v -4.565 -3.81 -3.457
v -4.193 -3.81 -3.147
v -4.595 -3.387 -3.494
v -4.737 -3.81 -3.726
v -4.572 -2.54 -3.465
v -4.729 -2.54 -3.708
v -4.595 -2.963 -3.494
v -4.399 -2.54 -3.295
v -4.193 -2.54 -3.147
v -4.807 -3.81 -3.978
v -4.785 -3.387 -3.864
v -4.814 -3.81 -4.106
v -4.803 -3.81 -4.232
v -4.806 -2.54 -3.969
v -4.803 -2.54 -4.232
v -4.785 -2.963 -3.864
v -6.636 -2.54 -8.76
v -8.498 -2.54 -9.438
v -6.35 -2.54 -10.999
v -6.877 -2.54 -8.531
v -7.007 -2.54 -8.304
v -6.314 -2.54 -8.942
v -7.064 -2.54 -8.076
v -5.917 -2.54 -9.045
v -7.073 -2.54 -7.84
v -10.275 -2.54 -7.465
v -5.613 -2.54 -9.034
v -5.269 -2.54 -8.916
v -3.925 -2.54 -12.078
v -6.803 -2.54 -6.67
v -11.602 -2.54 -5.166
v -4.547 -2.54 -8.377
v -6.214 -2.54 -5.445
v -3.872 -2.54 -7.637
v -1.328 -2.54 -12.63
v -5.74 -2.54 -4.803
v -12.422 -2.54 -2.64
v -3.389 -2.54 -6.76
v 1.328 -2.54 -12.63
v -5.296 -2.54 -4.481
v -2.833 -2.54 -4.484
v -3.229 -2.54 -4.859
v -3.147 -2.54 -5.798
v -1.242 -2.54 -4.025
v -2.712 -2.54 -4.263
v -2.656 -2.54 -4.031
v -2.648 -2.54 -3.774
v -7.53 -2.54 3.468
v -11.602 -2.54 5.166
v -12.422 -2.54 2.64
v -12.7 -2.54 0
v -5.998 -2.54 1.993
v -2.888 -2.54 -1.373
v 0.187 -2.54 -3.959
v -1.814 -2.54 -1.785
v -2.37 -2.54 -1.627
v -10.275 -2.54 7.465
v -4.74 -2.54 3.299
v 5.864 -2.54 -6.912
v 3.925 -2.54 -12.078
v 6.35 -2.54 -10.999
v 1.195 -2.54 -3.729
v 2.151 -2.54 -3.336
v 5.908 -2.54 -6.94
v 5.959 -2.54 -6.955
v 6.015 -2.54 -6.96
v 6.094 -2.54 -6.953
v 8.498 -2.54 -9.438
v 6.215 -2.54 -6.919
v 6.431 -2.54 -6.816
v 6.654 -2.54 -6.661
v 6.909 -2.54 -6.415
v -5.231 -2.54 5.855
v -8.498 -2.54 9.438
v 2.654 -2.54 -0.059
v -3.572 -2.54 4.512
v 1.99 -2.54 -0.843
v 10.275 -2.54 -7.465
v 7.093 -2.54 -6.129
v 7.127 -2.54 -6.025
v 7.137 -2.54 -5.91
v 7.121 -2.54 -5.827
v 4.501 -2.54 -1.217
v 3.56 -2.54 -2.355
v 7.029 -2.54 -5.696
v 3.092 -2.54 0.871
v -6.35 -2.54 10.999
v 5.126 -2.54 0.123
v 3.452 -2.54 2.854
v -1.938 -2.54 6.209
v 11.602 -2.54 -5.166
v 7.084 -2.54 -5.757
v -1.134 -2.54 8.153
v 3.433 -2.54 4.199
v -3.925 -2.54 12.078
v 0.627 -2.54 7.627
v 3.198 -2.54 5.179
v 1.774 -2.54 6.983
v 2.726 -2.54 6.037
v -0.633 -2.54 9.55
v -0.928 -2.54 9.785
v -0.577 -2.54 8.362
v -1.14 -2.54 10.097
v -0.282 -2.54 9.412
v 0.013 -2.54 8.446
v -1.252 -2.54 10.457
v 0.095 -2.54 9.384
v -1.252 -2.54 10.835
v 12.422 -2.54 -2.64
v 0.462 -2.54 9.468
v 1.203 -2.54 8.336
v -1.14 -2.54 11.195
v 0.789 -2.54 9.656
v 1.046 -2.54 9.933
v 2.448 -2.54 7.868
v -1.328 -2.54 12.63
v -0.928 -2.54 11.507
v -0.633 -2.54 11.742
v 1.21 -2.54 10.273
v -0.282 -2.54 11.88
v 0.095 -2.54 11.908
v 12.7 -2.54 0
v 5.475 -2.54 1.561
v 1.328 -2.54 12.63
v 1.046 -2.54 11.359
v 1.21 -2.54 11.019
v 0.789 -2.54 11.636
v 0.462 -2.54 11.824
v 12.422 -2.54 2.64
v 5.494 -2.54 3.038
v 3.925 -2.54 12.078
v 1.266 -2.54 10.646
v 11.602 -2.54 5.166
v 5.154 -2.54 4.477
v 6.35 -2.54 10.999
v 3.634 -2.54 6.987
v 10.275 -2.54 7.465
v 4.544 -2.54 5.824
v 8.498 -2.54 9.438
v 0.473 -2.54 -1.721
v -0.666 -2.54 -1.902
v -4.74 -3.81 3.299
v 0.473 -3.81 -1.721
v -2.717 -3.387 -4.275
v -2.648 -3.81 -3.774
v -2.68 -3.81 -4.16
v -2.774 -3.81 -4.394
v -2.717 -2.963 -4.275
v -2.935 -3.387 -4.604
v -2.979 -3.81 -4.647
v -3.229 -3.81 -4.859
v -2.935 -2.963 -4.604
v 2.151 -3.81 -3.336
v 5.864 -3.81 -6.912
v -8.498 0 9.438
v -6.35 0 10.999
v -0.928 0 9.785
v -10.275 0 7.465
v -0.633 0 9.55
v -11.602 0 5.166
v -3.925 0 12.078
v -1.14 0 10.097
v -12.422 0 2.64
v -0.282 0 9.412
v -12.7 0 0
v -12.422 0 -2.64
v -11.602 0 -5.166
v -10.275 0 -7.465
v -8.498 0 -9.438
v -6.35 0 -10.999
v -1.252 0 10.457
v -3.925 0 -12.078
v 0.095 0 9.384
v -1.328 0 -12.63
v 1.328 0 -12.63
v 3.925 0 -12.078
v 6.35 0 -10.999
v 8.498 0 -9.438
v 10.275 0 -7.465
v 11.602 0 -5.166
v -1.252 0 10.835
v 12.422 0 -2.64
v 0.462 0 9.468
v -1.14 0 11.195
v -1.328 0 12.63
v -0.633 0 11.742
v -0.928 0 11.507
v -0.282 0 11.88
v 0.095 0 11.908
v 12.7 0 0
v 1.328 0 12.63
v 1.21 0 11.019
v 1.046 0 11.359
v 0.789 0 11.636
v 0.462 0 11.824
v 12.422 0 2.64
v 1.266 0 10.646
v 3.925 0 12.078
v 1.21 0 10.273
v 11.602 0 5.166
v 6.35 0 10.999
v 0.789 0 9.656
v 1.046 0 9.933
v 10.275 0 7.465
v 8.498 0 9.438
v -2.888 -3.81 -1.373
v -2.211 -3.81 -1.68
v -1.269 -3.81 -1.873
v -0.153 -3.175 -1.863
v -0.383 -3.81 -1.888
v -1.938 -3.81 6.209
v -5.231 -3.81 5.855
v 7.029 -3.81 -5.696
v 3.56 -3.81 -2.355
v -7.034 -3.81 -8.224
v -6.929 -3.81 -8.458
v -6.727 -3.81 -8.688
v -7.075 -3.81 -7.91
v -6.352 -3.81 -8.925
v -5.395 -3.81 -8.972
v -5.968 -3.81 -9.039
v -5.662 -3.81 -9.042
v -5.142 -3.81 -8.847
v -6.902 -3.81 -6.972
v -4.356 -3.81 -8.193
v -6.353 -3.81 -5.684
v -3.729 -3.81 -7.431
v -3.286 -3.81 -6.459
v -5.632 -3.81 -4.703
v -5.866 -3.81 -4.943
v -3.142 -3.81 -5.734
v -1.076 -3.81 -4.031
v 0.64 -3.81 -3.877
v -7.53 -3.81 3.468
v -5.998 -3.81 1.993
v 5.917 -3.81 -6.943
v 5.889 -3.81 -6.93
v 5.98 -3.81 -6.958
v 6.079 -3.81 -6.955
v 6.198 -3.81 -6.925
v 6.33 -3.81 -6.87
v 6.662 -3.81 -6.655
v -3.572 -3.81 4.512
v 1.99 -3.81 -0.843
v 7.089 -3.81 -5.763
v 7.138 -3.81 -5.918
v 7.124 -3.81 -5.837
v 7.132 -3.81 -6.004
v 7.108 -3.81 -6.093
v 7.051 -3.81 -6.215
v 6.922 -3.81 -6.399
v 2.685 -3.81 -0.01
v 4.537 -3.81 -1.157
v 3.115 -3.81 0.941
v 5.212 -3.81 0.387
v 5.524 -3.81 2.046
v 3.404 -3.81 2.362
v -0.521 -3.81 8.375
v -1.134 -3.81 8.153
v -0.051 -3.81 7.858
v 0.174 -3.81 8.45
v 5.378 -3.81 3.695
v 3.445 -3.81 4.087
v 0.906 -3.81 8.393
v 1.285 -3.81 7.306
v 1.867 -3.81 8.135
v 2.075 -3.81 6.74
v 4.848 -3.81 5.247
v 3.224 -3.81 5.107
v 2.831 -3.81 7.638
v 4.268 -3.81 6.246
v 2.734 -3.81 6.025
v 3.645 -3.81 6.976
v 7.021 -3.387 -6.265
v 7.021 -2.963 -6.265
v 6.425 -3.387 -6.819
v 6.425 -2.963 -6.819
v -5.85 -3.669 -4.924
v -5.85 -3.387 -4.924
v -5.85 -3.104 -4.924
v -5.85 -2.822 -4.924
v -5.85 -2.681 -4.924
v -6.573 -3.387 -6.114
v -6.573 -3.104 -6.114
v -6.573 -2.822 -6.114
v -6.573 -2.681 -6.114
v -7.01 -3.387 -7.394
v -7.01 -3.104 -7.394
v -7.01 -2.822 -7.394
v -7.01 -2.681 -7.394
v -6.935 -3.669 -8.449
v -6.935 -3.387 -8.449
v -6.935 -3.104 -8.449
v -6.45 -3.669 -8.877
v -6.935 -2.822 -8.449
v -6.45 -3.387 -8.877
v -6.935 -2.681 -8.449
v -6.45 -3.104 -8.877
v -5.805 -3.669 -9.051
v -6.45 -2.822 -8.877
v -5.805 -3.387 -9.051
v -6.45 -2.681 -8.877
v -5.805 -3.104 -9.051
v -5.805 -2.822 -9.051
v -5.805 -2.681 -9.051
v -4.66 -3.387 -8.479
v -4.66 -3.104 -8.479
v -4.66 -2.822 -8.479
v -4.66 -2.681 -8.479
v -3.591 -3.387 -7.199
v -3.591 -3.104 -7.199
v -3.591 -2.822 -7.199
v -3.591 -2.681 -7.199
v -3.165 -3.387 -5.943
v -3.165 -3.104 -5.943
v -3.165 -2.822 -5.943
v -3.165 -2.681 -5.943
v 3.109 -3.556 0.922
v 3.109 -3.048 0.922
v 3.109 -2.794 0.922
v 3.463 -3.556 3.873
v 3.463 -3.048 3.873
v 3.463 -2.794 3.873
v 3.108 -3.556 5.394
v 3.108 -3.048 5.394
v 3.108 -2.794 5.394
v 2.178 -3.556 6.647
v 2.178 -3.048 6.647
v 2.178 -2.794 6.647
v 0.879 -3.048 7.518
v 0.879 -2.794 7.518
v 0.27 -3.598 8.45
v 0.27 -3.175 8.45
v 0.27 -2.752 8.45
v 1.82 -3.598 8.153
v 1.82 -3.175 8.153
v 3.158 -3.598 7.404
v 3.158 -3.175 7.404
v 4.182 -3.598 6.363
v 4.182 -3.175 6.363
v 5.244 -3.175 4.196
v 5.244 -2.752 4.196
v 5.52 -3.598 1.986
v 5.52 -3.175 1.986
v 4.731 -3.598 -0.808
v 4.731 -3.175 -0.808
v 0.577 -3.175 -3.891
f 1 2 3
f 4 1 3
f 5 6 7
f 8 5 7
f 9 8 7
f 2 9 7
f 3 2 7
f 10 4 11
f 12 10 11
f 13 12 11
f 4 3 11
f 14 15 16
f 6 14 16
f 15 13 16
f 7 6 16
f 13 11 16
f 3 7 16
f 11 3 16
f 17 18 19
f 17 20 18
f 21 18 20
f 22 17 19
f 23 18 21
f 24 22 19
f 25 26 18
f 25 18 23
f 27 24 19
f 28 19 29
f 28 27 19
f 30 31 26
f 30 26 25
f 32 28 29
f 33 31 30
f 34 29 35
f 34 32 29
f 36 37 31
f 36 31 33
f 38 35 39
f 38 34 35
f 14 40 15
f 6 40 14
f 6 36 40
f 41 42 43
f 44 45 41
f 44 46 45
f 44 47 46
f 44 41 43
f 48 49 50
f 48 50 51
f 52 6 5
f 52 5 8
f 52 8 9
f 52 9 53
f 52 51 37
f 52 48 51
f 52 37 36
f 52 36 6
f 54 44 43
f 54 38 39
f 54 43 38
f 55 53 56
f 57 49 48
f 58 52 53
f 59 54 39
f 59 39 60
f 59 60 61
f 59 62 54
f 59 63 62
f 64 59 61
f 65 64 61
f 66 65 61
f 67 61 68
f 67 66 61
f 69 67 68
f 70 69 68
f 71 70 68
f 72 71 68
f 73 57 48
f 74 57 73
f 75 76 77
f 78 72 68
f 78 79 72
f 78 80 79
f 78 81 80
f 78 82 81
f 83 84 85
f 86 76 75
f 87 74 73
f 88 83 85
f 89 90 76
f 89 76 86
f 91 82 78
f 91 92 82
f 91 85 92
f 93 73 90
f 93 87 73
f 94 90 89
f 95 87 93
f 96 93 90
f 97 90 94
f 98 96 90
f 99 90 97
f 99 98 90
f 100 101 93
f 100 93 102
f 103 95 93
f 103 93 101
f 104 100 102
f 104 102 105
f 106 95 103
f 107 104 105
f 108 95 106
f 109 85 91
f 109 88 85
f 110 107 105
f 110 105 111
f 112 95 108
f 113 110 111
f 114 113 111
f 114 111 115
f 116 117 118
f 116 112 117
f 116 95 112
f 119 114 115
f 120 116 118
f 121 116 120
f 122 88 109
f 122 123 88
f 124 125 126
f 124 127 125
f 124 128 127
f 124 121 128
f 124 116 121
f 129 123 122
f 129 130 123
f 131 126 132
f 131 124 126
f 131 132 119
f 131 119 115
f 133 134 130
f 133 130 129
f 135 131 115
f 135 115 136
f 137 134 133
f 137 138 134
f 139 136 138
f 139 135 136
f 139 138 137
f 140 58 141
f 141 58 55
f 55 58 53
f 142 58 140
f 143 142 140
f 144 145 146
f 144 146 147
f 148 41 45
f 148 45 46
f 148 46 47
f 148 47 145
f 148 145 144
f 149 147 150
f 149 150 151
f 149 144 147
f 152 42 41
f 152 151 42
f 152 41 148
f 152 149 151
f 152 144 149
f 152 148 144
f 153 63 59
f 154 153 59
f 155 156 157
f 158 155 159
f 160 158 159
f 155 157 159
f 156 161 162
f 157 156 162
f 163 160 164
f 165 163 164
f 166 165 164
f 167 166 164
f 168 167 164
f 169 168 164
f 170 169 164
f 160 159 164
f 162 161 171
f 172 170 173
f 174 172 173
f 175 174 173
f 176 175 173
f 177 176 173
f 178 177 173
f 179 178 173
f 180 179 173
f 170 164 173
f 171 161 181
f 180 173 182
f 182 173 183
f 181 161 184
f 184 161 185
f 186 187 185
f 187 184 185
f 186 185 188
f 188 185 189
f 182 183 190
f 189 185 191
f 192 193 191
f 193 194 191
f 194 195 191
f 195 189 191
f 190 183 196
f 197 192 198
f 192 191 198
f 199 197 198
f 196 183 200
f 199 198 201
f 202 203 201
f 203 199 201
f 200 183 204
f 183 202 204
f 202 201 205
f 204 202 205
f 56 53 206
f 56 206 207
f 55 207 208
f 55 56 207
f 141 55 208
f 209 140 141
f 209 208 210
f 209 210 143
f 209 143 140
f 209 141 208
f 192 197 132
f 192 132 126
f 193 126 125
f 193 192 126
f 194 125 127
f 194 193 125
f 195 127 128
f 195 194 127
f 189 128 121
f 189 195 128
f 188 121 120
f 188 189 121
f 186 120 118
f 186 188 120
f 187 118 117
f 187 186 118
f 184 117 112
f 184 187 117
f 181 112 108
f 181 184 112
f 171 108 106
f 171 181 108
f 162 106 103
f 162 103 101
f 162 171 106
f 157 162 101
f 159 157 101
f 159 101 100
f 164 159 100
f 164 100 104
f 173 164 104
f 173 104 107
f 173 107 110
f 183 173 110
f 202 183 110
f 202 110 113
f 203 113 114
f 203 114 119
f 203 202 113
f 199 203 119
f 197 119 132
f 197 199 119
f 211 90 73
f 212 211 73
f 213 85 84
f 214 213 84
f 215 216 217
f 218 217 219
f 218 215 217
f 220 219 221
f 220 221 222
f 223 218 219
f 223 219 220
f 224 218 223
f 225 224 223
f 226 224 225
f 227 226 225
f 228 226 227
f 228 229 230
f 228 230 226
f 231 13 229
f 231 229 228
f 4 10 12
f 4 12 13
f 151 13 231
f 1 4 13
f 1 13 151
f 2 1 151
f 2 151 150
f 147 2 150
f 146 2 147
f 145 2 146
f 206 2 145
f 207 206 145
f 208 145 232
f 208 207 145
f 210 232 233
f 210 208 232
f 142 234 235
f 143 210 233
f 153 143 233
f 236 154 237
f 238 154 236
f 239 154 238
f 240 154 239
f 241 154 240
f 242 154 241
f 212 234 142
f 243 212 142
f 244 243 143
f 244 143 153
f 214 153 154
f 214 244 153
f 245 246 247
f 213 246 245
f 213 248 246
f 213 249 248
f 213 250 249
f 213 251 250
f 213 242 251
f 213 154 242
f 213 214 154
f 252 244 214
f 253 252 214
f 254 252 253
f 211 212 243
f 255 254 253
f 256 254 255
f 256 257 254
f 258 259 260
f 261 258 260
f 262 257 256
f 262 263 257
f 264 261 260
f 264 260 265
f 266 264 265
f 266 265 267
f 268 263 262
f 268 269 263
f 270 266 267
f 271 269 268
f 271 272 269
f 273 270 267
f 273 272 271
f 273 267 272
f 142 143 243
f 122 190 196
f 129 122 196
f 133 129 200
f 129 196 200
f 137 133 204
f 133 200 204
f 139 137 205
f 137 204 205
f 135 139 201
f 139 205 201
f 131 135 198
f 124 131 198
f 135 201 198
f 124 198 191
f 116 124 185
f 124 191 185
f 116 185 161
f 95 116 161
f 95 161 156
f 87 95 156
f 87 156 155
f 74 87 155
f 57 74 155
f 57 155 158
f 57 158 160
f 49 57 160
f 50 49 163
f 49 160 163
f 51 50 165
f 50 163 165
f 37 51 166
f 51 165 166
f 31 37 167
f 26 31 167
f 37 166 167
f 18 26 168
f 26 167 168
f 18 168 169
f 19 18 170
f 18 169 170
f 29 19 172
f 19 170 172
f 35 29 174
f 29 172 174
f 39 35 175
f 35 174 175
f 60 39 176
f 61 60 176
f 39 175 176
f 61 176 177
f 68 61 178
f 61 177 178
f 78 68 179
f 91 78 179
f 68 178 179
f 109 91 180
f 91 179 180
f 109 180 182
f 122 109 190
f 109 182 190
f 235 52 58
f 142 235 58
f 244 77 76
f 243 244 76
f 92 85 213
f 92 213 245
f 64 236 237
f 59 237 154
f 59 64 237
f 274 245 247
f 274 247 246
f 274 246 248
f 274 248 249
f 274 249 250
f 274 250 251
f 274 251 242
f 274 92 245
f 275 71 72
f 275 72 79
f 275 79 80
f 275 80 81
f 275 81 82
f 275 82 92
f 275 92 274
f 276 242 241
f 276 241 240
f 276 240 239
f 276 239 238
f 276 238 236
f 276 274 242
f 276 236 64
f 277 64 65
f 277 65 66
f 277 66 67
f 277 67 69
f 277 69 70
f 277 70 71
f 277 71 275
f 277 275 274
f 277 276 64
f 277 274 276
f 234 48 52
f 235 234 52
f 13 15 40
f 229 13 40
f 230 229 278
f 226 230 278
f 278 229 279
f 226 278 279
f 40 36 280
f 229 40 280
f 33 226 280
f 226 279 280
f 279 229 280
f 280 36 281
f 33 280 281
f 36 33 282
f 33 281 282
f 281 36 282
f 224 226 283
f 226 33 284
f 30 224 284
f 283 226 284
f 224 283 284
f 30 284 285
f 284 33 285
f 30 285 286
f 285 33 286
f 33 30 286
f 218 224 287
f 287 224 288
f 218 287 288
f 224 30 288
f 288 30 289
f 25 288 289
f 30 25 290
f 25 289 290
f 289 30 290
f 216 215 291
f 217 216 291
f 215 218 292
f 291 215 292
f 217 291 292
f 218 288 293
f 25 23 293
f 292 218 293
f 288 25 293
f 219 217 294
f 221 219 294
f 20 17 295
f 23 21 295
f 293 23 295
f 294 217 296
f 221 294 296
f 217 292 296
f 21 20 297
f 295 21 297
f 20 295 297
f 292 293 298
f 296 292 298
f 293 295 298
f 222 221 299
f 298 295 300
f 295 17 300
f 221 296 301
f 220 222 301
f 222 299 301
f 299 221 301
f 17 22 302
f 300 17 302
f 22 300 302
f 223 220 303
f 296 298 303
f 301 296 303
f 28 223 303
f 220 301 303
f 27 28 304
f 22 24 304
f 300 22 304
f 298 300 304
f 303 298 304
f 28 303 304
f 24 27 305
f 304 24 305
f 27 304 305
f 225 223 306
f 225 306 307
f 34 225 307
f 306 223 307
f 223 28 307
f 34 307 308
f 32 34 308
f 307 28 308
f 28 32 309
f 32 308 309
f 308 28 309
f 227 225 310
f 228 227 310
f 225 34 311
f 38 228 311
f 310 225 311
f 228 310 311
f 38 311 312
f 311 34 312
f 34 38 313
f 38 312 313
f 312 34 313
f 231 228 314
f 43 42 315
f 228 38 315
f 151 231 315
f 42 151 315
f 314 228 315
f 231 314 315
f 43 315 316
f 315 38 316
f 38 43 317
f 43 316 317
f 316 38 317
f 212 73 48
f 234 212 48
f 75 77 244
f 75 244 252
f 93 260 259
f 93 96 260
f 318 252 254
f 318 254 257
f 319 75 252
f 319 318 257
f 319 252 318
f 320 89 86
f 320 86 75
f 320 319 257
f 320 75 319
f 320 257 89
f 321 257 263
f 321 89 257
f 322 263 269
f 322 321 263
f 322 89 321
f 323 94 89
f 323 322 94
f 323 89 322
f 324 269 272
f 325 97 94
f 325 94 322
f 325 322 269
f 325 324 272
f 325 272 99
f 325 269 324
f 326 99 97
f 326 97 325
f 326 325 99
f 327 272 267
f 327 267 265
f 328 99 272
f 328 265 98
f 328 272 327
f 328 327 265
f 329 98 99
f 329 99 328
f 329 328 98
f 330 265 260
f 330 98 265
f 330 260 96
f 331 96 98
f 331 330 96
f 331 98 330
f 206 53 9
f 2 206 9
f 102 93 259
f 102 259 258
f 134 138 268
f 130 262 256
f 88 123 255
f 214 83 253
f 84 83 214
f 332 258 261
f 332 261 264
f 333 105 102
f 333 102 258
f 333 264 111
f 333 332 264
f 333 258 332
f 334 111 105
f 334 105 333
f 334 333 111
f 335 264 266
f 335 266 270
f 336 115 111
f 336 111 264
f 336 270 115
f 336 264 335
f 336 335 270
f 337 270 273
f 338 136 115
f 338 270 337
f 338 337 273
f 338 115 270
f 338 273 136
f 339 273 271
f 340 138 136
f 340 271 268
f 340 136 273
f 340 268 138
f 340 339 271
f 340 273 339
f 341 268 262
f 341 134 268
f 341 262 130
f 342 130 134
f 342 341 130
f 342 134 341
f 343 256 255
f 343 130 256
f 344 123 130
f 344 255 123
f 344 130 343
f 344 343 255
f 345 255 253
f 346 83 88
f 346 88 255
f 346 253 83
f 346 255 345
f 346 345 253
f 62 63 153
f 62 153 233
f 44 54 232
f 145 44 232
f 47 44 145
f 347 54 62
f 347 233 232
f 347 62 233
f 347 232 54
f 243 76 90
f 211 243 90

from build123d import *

# Parameters (mm, degrees)
F0_R     = 12.7
F0_R_2   = 1.2657765137
F1_DEPTH = 2.54
F2_DEPTH = 3.81


with BuildPart() as f1:
    # F0 (on Front) → F1 (new body)
    with BuildSketch(Plane.XZ):
        Circle(F0_R)
        with BuildLine():
            Line((-5.9980981207, 1.9931174991), (-7.5295561864, 3.4678540847))
            Line((-7.5295561864, 3.4678540847), (-5.2310121246, 5.8548050001))
            Line((-5.2310121246, 5.8548050001), (-1.9379338482, 6.2094442546))
            Line((-1.9379338482, 6.2094442546), (-3.5720530129, 4.5124734196))
            Line((-3.5720530129, 4.5124734196), (1.9898101435, -0.8433918597))
            add(Edge.make_bspline(
                [(1.9898101435, -0.8433918597), (2.181839817, -0.6686980904), (2.9923268789, 0.2254004935), (3.5097247457, 2.2611806235), (3.5582576463, 5.5722342669), (1.0757347307, 7.7154267447), (-0.6801631143, 8.0019912543), (-1.1338472479, 8.1532060726)],
                knots=[0.2966989611, 0.2966989611, 0.2966989611, 0.2966989611, 0.3408733214, 0.5050447961, 0.6807588711, 0.8554095009, 1, 1, 1, 1], degree=3))
            add(Edge.make_bspline(
                [(-1.1338472479, 8.1532060726), (-0.3417312748, 8.5800115317), (2.0076237784, 8.4565524057), (4.3362523203, 6.5122135204), (5.3334470637, 4.2153426842), (5.7115580421, 1.9856279561), (4.9509483833, -0.7254500645), (4.0310276615, -1.9202184076), (3.5599331607, -2.3553613411)],
                knots=[0, 0, 0, 0, 0.1298019735, 0.2598346579, 0.3771771158, 0.4898846412, 0.6185830731, 0.71201256, 0.71201256, 0.71201256, 0.71201256], degree=3))
            Line((3.5599331607, -2.3553613411), (7.0293718017, -5.6963004173))
            add(Edge.make_bspline(
                [(7.0293718017, -5.6963004173), (7.5221849988, -6.1239386803), (6.1995871365, -7.1983786766), (5.8641284704, -6.9122067653)],
                knots=[0, 0, 0, 0, 1.6841081521, 1.6841081521, 1.6841081521, 1.6841081521], degree=3))
            Line((5.8641284704, -6.9122067653), (2.1508335508, -3.3364432536))
            add(Edge.make_bspline(
                [(2.1508335508, -3.3364432536), (1.6752853418, -3.5797182972), (0.1572248048, -4.1350575123), (-1.7609307542, -4.0777400136), (-2.6475286577, -3.7737630773)],
                knots=[0.7925286484, 0.7925286484, 0.7925286484, 0.7925286484, 0.8643366586, 1, 1, 1, 1], degree=3))
            add(Edge.make_bspline(
                [(-2.6475286577, -3.7737630773), (-2.6181081776, -4.3935817666), (-2.9226117767, -4.6085258946), (-3.22854775, -4.8588160425)],
                knots=[0, 0, 0, 0, 1.230822133, 1.230822133, 1.230822133, 1.230822133], degree=3))
            add(Edge.make_bspline(
                [(-4.8033702187, -4.2323740199), (-5.4212825728, -4.5293064688), (-5.8316147769, -4.7778373261), (-6.6343124935, -6.1229466147), (-7.0458907635, -7.3455408415), (-7.16887863, -8.5506128462), (-5.7407828877, -9.3119682828), (-4.6015383692, -8.4966283885), (-3.5049723158, -7.3084696393), (-3.0930861156, -5.8275163642), (-3.1405196662, -5.4844899198), (-3.22854775, -4.8588160425)],
                knots=[0, 0, 0, 0, 0.1093958452, 0.2246343447, 0.3382227988, 0.4386314231, 0.5491357113, 0.6596208576, 0.7857586816, 0.8981987194, 1, 1, 1, 1], degree=3))
            add(Edge.make_bspline(
                [(-4.1932296008, -3.1469750684), (-4.7146673314, -3.4729705658), (-4.8571061343, -3.8741342723), (-4.8033702187, -4.2323740199)],
                knots=[0, 0, 0, 0, 1.2451355178, 1.2451355178, 1.2451355178, 1.2451355178], degree=3))
            Line((-4.1932296008, -3.1469750684), (-2.8876534512, -1.373414264))
            add(Edge.make_bspline(
                [(-2.8876534512, -1.373414264), (-2.386986779, -1.7200056059), (-0.9613233884, -2.068928273), (0.2712498796, -1.7849151458), (0.4732034023, -1.7209484435)],
                knots=[0, 0, 0, 0, 0.1659033418, 0.1998088447, 0.1998088447, 0.1998088447, 0.1998088447], degree=3))
            Line((0.4732034023, -1.7209484435), (-4.740216914, 3.2993794706))
            Line((-4.740216914, 3.2993794706), (-5.9980981207, 1.9931174991))
        make_face(mode=Mode.SUBTRACT)
        with Locations((0, 10.6459101662)):
            Circle(F0_R_2, mode=Mode.SUBTRACT)
        with BuildLine():
            add(Edge.make_bspline(
                [(0.4732034023, -1.7209484435), (1.0503162203, -1.5381538908), (1.5686206286, -1.2265575579), (1.9898101435, -0.8433918597)],
                knots=[0.1998088447, 0.1998088447, 0.1998088447, 0.1998088447, 0.2966989611, 0.2966989611, 0.2966989611, 0.2966989611], degree=3))
            add(Edge.make_bspline(
                [(-2.8876534512, -1.373414264), (-2.386986779, -1.7200056059), (-0.9613233884, -2.068928273), (0.2712498796, -1.7849151458), (0.4732034023, -1.7209484435)],
                knots=[0, 0, 0, 0, 0.1659033418, 0.1998088447, 0.1998088447, 0.1998088447, 0.1998088447], degree=3))
            Line((-2.8876534512, -1.373414264), (-4.1932296008, -3.1469750684))
            add(Edge.make_bspline(
                [(-4.1932296008, -3.1469750684), (-4.7146673314, -3.4729705658), (-4.8571061343, -3.8741342723), (-4.8033702187, -4.2323740199)],
                knots=[0, 0, 0, 0, 1.2451355178, 1.2451355178, 1.2451355178, 1.2451355178], degree=3))
            add(Edge.make_bspline(
                [(-4.8033702187, -4.2323740199), (-5.4212825728, -4.5293064688), (-5.8316147769, -4.7778373261), (-6.6343124935, -6.1229466147), (-7.0458907635, -7.3455408415), (-7.16887863, -8.5506128462), (-5.7407828877, -9.3119682828), (-4.6015383692, -8.4966283885), (-3.5049723158, -7.3084696393), (-3.0930861156, -5.8275163642), (-3.1405196662, -5.4844899198), (-3.22854775, -4.8588160425)],
                knots=[0, 0, 0, 0, 0.1093958452, 0.2246343447, 0.3382227988, 0.4386314231, 0.5491357113, 0.6596208576, 0.7857586816, 0.8981987194, 1, 1, 1, 1], degree=3))
            add(Edge.make_bspline(
                [(-2.6475286577, -3.7737630773), (-2.6181081776, -4.3935817666), (-2.9226117767, -4.6085258946), (-3.22854775, -4.8588160425)],
                knots=[0, 0, 0, 0, 1.230822133, 1.230822133, 1.230822133, 1.230822133], degree=3))
            add(Edge.make_bspline(
                [(2.1508335508, -3.3364432536), (1.6752853418, -3.5797182972), (0.1572248048, -4.1350575123), (-1.7609307542, -4.0777400136), (-2.6475286577, -3.7737630773)],
                knots=[0.7925286484, 0.7925286484, 0.7925286484, 0.7925286484, 0.8643366586, 1, 1, 1, 1], degree=3))
            add(Edge.make_bspline(
                [(3.5599331607, -2.3553613411), (3.4359379602, -2.4698938503), (3.0108649417, -2.8296074096), (2.5211954544, -3.1469781131), (2.1508335508, -3.3364432536)],
                knots=[0.71201256, 0.71201256, 0.71201256, 0.71201256, 0.7366038212, 0.7925286484, 0.7925286484, 0.7925286484, 0.7925286484], degree=3))
            add(Edge.make_bspline(
                [(-1.1338472479, 8.1532060726), (-0.3417312748, 8.5800115317), (2.0076237784, 8.4565524057), (4.3362523203, 6.5122135204), (5.3334470637, 4.2153426842), (5.7115580421, 1.9856279561), (4.9509483833, -0.7254500645), (4.0310276615, -1.9202184076), (3.5599331607, -2.3553613411)],
                knots=[0, 0, 0, 0, 0.1298019735, 0.2598346579, 0.3771771158, 0.4898846412, 0.6185830731, 0.71201256, 0.71201256, 0.71201256, 0.71201256], degree=3))
            add(Edge.make_bspline(
                [(1.9898101435, -0.8433918597), (2.181839817, -0.6686980904), (2.9923268789, 0.2254004935), (3.5097247457, 2.2611806235), (3.5582576463, 5.5722342669), (1.0757347307, 7.7154267447), (-0.6801631143, 8.0019912543), (-1.1338472479, 8.1532060726)],
                knots=[0.2966989611, 0.2966989611, 0.2966989611, 0.2966989611, 0.3408733214, 0.5050447961, 0.6807588711, 0.8554095009, 1, 1, 1, 1], degree=3))
        make_face()
        with BuildLine():
            Line((7.0293718017, -5.6963004173), (3.5599331607, -2.3553613411))
            add(Edge.make_bspline(
                [(3.5599331607, -2.3553613411), (3.4359379602, -2.4698938503), (3.0108649417, -2.8296074096), (2.5211954544, -3.1469781131), (2.1508335508, -3.3364432536)],
                knots=[0.71201256, 0.71201256, 0.71201256, 0.71201256, 0.7366038212, 0.7925286484, 0.7925286484, 0.7925286484, 0.7925286484], degree=3))
            Line((2.1508335508, -3.3364432536), (5.8641284704, -6.9122067653))
            add(Edge.make_bspline(
                [(7.0293718017, -5.6963004173), (7.5221849988, -6.1239386803), (6.1995871365, -7.1983786766), (5.8641284704, -6.9122067653)],
                knots=[0, 0, 0, 0, 1.6841081521, 1.6841081521, 1.6841081521, 1.6841081521], degree=3))
        make_face()
    extrude(amount=F1_DEPTH)

    # F0 (on Front) → F2 (join)
    with BuildSketch(Plane.XZ):
        with BuildLine():
            Line((-5.2310121246, 5.8548050001), (-7.5295561864, 3.4678540847))
            Line((-7.5295561864, 3.4678540847), (-5.9980981207, 1.9931174991))
            Line((-5.9980981207, 1.9931174991), (-4.740216914, 3.2993794706))
            Line((-4.740216914, 3.2993794706), (0.4732034023, -1.7209484435))
            add(Edge.make_bspline(
                [(0.4732034023, -1.7209484435), (1.0503162203, -1.5381538908), (1.5686206286, -1.2265575579), (1.9898101435, -0.8433918597)],
                knots=[0.1998088447, 0.1998088447, 0.1998088447, 0.1998088447, 0.2966989611, 0.2966989611, 0.2966989611, 0.2966989611], degree=3))
            Line((1.9898101435, -0.8433918597), (-3.5720530129, 4.5124734196))
            Line((-3.5720530129, 4.5124734196), (-1.9379338482, 6.2094442546))
            Line((-1.9379338482, 6.2094442546), (-5.2310121246, 5.8548050001))
        make_face()
        with BuildLine():
            add(Edge.make_bspline(
                [(0.4732034023, -1.7209484435), (1.0503162203, -1.5381538908), (1.5686206286, -1.2265575579), (1.9898101435, -0.8433918597)],
                knots=[0.1998088447, 0.1998088447, 0.1998088447, 0.1998088447, 0.2966989611, 0.2966989611, 0.2966989611, 0.2966989611], degree=3))
            add(Edge.make_bspline(
                [(-2.8876534512, -1.373414264), (-2.386986779, -1.7200056059), (-0.9613233884, -2.068928273), (0.2712498796, -1.7849151458), (0.4732034023, -1.7209484435)],
                knots=[0, 0, 0, 0, 0.1659033418, 0.1998088447, 0.1998088447, 0.1998088447, 0.1998088447], degree=3))
            Line((-2.8876534512, -1.373414264), (-4.1932296008, -3.1469750684))
            add(Edge.make_bspline(
                [(-4.1932296008, -3.1469750684), (-4.7146673314, -3.4729705658), (-4.8571061343, -3.8741342723), (-4.8033702187, -4.2323740199)],
                knots=[0, 0, 0, 0, 1.2451355178, 1.2451355178, 1.2451355178, 1.2451355178], degree=3))
            add(Edge.make_bspline(
                [(-4.8033702187, -4.2323740199), (-5.4212825728, -4.5293064688), (-5.8316147769, -4.7778373261), (-6.6343124935, -6.1229466147), (-7.0458907635, -7.3455408415), (-7.16887863, -8.5506128462), (-5.7407828877, -9.3119682828), (-4.6015383692, -8.4966283885), (-3.5049723158, -7.3084696393), (-3.0930861156, -5.8275163642), (-3.1405196662, -5.4844899198), (-3.22854775, -4.8588160425)],
                knots=[0, 0, 0, 0, 0.1093958452, 0.2246343447, 0.3382227988, 0.4386314231, 0.5491357113, 0.6596208576, 0.7857586816, 0.8981987194, 1, 1, 1, 1], degree=3))
            add(Edge.make_bspline(
                [(-2.6475286577, -3.7737630773), (-2.6181081776, -4.3935817666), (-2.9226117767, -4.6085258946), (-3.22854775, -4.8588160425)],
                knots=[0, 0, 0, 0, 1.230822133, 1.230822133, 1.230822133, 1.230822133], degree=3))
            add(Edge.make_bspline(
                [(2.1508335508, -3.3364432536), (1.6752853418, -3.5797182972), (0.1572248048, -4.1350575123), (-1.7609307542, -4.0777400136), (-2.6475286577, -3.7737630773)],
                knots=[0.7925286484, 0.7925286484, 0.7925286484, 0.7925286484, 0.8643366586, 1, 1, 1, 1], degree=3))
            add(Edge.make_bspline(
                [(3.5599331607, -2.3553613411), (3.4359379602, -2.4698938503), (3.0108649417, -2.8296074096), (2.5211954544, -3.1469781131), (2.1508335508, -3.3364432536)],
                knots=[0.71201256, 0.71201256, 0.71201256, 0.71201256, 0.7366038212, 0.7925286484, 0.7925286484, 0.7925286484, 0.7925286484], degree=3))
            add(Edge.make_bspline(
                [(-1.1338472479, 8.1532060726), (-0.3417312748, 8.5800115317), (2.0076237784, 8.4565524057), (4.3362523203, 6.5122135204), (5.3334470637, 4.2153426842), (5.7115580421, 1.9856279561), (4.9509483833, -0.7254500645), (4.0310276615, -1.9202184076), (3.5599331607, -2.3553613411)],
                knots=[0, 0, 0, 0, 0.1298019735, 0.2598346579, 0.3771771158, 0.4898846412, 0.6185830731, 0.71201256, 0.71201256, 0.71201256, 0.71201256], degree=3))
            add(Edge.make_bspline(
                [(1.9898101435, -0.8433918597), (2.181839817, -0.6686980904), (2.9923268789, 0.2254004935), (3.5097247457, 2.2611806235), (3.5582576463, 5.5722342669), (1.0757347307, 7.7154267447), (-0.6801631143, 8.0019912543), (-1.1338472479, 8.1532060726)],
                knots=[0.2966989611, 0.2966989611, 0.2966989611, 0.2966989611, 0.3408733214, 0.5050447961, 0.6807588711, 0.8554095009, 1, 1, 1, 1], degree=3))
        make_face()
        with BuildLine():
            Line((7.0293718017, -5.6963004173), (3.5599331607, -2.3553613411))
            add(Edge.make_bspline(
                [(3.5599331607, -2.3553613411), (3.4359379602, -2.4698938503), (3.0108649417, -2.8296074096), (2.5211954544, -3.1469781131), (2.1508335508, -3.3364432536)],
                knots=[0.71201256, 0.71201256, 0.71201256, 0.71201256, 0.7366038212, 0.7925286484, 0.7925286484, 0.7925286484, 0.7925286484], degree=3))
            Line((2.1508335508, -3.3364432536), (5.8641284704, -6.9122067653))
            add(Edge.make_bspline(
                [(7.0293718017, -5.6963004173), (7.5221849988, -6.1239386803), (6.1995871365, -7.1983786766), (5.8641284704, -6.9122067653)],
                knots=[0, 0, 0, 0, 1.6841081521, 1.6841081521, 1.6841081521, 1.6841081521], degree=3))
        make_face()
    extrude(amount=F2_DEPTH)


solid = f1.part
